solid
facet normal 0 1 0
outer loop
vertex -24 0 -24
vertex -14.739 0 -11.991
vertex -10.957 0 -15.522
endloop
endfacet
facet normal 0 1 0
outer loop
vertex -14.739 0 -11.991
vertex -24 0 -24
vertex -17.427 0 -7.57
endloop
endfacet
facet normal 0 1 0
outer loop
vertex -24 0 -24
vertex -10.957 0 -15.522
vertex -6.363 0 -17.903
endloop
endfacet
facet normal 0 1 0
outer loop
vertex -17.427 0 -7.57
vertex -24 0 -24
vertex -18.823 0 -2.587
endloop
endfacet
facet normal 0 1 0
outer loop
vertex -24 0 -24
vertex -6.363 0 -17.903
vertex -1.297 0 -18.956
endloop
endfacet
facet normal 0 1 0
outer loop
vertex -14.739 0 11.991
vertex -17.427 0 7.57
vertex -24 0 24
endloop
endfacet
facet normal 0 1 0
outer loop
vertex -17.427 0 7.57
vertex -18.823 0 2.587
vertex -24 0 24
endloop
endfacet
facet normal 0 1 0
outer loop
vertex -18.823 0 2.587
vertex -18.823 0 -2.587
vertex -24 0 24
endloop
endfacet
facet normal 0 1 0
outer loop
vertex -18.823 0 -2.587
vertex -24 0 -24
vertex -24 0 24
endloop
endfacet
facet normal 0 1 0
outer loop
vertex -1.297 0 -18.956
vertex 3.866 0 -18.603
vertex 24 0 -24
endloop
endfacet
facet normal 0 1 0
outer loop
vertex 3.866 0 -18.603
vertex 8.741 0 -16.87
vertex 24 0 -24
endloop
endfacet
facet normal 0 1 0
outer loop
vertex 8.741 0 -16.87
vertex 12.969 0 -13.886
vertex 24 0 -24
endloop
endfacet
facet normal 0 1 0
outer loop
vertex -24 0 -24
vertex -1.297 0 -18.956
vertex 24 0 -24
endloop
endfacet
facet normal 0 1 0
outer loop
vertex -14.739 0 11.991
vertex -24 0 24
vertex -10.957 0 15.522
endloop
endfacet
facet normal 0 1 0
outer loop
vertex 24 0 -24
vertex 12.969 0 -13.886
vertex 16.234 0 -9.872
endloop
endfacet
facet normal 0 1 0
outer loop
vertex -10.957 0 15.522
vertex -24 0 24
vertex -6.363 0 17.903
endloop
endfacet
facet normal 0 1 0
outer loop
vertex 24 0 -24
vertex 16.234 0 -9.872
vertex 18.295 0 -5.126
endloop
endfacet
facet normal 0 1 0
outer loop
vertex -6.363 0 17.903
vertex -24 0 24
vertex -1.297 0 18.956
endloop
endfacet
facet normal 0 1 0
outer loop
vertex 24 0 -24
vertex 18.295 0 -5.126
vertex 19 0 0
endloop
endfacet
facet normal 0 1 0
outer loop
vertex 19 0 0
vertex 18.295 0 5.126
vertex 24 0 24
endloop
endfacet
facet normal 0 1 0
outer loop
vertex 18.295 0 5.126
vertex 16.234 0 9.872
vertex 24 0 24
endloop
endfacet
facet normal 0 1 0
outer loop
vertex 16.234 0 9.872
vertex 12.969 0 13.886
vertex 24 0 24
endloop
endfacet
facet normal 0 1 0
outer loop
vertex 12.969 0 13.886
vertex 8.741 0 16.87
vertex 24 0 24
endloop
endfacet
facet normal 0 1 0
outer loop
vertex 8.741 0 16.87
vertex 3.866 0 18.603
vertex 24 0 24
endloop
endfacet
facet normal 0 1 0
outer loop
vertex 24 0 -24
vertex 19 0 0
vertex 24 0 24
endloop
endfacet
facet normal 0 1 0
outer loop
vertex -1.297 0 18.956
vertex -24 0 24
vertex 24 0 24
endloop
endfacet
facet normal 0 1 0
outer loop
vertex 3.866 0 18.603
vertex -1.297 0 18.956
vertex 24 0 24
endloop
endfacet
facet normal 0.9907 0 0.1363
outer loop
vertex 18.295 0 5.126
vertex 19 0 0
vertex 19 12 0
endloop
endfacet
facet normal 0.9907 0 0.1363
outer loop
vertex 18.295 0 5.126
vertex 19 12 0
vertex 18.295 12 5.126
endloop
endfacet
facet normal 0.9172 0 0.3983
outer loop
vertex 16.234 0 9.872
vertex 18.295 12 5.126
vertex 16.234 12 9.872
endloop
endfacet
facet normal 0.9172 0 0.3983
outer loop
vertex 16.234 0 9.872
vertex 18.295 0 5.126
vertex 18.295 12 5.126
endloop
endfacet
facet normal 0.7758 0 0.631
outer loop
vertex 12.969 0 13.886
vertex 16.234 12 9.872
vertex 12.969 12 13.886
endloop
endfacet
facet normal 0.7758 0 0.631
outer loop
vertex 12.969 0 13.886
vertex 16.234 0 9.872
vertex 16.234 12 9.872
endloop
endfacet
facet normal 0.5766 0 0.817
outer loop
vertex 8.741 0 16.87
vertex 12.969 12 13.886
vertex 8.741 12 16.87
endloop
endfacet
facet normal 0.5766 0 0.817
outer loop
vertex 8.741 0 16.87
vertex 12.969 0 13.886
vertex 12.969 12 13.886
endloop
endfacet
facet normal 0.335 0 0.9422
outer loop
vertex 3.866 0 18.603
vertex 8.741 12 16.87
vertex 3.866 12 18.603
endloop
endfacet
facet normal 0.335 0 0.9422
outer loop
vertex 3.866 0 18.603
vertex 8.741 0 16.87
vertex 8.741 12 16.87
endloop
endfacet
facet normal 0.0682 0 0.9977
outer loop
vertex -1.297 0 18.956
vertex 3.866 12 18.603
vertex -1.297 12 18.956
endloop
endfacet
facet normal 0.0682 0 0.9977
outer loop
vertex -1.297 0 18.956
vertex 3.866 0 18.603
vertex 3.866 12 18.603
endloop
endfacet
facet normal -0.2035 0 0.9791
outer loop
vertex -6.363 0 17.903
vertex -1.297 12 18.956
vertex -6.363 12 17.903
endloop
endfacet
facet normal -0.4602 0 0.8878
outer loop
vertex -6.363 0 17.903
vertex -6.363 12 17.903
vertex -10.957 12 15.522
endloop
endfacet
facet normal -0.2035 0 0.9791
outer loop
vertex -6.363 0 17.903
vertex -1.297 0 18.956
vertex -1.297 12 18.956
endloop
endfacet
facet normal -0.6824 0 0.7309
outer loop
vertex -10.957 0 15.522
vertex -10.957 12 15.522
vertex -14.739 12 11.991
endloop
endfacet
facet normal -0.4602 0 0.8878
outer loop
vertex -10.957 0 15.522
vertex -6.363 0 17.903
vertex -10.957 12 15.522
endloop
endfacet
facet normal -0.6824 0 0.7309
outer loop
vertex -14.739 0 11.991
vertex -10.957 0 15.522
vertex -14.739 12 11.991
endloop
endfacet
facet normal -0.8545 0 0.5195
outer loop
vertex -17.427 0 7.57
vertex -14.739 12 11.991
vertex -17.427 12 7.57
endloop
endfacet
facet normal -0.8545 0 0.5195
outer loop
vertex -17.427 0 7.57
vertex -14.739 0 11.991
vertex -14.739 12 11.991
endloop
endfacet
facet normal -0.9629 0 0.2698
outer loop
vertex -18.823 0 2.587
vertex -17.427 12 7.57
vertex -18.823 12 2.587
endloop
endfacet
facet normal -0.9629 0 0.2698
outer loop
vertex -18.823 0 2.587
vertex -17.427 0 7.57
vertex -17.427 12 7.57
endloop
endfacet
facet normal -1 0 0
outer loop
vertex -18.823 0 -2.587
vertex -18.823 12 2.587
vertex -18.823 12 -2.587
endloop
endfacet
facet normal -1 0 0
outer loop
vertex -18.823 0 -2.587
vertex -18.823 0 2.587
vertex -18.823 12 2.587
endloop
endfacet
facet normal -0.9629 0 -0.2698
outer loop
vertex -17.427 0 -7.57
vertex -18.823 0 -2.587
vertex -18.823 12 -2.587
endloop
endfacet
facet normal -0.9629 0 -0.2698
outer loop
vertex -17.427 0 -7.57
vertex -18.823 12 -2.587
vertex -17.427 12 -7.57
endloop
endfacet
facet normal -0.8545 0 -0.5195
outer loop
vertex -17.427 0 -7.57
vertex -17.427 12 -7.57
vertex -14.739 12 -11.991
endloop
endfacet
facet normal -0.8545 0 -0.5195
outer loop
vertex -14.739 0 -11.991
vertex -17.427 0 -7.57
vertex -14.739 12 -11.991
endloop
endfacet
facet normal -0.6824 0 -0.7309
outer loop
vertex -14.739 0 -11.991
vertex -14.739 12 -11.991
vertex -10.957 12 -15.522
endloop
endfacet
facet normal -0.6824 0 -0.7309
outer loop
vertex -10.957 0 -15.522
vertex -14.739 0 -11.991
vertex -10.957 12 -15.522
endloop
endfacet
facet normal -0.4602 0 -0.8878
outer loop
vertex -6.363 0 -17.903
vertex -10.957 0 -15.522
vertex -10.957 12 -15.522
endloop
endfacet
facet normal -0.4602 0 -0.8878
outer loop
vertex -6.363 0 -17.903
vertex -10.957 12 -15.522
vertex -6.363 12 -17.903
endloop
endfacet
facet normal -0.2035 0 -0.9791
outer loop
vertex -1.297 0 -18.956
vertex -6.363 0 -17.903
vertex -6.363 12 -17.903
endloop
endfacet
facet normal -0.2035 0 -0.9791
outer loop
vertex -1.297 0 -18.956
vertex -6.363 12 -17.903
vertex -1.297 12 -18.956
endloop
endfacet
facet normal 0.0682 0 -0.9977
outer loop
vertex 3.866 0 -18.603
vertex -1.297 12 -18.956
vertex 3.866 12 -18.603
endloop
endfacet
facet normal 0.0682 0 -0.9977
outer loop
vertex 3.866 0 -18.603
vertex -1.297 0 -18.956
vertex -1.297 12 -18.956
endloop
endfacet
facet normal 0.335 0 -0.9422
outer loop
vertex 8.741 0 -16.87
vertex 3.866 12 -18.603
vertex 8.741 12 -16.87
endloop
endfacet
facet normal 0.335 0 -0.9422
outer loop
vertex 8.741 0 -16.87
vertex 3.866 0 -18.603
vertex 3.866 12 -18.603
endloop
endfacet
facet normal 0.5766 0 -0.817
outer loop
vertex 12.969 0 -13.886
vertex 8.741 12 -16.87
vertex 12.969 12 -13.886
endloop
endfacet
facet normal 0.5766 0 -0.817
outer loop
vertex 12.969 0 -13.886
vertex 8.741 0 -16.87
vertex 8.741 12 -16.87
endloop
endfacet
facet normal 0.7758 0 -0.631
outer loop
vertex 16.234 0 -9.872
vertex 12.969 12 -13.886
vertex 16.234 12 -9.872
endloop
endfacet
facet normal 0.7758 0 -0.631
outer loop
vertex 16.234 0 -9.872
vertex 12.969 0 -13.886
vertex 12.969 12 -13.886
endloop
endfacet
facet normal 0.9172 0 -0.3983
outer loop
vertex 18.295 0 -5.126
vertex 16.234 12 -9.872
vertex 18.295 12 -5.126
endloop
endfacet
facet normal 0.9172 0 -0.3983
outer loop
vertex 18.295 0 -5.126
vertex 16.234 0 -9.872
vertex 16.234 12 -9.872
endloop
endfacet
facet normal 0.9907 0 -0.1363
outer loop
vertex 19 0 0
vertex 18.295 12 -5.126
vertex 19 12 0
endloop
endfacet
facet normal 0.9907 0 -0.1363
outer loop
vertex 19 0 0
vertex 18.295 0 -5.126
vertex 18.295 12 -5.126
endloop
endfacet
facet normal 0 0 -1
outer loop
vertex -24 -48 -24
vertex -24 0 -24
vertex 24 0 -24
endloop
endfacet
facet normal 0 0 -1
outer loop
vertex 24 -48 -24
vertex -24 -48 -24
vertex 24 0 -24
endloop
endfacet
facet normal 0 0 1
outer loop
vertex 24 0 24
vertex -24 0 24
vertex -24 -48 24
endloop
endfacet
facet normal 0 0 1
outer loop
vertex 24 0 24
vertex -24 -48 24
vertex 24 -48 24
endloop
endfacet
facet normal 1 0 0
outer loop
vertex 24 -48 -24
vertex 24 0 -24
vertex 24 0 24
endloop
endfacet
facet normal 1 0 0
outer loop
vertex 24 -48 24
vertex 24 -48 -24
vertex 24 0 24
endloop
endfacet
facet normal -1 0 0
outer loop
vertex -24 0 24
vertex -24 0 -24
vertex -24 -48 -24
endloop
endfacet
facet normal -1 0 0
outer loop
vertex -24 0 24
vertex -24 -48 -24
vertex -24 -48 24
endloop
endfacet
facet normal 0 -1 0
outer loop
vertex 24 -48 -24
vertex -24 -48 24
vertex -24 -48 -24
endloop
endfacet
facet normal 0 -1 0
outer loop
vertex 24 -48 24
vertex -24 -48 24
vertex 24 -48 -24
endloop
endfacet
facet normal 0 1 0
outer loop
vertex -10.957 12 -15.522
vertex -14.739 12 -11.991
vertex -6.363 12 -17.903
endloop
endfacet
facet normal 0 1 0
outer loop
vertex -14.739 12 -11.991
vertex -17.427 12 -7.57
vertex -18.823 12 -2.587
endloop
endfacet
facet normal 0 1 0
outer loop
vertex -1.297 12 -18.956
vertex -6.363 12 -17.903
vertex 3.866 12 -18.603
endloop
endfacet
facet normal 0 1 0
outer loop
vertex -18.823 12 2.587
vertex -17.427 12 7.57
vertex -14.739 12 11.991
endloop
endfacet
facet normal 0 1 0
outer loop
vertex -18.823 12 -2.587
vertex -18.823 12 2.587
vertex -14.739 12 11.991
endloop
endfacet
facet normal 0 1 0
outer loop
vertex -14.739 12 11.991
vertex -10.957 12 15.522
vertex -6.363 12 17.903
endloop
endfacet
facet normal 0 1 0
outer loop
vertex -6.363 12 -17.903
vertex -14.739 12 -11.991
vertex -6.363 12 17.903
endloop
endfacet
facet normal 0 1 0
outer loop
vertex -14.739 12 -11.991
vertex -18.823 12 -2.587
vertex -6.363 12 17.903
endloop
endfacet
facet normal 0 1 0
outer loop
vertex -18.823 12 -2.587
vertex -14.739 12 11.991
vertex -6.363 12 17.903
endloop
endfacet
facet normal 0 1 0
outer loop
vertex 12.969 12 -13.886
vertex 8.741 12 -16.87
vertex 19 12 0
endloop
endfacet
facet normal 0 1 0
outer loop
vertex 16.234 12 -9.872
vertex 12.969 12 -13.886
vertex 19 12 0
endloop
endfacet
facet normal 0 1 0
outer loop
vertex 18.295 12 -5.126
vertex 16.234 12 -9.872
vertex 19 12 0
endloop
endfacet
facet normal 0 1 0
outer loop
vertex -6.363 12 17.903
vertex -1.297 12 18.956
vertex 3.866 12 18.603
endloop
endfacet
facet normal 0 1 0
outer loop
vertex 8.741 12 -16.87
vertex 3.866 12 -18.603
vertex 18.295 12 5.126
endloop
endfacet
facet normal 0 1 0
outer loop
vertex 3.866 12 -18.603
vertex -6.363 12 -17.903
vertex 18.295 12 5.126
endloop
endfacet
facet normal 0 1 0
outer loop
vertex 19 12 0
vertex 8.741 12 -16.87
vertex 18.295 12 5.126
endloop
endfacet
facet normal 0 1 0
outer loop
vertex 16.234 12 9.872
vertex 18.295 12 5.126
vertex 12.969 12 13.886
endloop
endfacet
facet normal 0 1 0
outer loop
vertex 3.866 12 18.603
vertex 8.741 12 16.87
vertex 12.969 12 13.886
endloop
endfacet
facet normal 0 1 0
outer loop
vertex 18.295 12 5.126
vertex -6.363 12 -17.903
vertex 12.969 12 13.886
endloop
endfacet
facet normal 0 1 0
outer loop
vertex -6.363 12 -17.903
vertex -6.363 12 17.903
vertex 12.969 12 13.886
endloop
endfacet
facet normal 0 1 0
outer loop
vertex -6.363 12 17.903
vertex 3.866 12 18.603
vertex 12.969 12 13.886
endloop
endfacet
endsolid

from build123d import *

# Parameters (mm, degrees)
F0_W     = 48
F0_H     = 48
F1_DEPTH = 48
F2_R     = 8
F3_DEPTH = 7
F3_TAPER = -3
F4_R     = 19
F5_DEPTH = 12


with BuildPart() as f1:
    # F0 (on Front) → F1 (new body)
    with BuildSketch(Plane.XZ):
        Rectangle(F0_W, F0_H)
    extrude(amount=F1_DEPTH)

    # F2 (on Front) → F3 (join)
    with BuildSketch(Plane.XZ):
        with Locations((-11.5896230564, 11.2924538553)):
            Circle(F2_R)
        with Locations((11.8867922574, 11.2924538553)):
            Circle(F2_R)
        with Locations((11.8867922574, -11.5896230564)):
            Circle(F2_R)
        with Locations((-11.5896230564, -11.5896230564)):
            Circle(F2_R)
    extrude(amount=F3_DEPTH, taper=F3_TAPER)

    # F4 (on Front) → F5 (join)
    with BuildSketch(Plane.XZ):
        Circle(F4_R)
    extrude(amount=-F5_DEPTH)


solid = f1.part
